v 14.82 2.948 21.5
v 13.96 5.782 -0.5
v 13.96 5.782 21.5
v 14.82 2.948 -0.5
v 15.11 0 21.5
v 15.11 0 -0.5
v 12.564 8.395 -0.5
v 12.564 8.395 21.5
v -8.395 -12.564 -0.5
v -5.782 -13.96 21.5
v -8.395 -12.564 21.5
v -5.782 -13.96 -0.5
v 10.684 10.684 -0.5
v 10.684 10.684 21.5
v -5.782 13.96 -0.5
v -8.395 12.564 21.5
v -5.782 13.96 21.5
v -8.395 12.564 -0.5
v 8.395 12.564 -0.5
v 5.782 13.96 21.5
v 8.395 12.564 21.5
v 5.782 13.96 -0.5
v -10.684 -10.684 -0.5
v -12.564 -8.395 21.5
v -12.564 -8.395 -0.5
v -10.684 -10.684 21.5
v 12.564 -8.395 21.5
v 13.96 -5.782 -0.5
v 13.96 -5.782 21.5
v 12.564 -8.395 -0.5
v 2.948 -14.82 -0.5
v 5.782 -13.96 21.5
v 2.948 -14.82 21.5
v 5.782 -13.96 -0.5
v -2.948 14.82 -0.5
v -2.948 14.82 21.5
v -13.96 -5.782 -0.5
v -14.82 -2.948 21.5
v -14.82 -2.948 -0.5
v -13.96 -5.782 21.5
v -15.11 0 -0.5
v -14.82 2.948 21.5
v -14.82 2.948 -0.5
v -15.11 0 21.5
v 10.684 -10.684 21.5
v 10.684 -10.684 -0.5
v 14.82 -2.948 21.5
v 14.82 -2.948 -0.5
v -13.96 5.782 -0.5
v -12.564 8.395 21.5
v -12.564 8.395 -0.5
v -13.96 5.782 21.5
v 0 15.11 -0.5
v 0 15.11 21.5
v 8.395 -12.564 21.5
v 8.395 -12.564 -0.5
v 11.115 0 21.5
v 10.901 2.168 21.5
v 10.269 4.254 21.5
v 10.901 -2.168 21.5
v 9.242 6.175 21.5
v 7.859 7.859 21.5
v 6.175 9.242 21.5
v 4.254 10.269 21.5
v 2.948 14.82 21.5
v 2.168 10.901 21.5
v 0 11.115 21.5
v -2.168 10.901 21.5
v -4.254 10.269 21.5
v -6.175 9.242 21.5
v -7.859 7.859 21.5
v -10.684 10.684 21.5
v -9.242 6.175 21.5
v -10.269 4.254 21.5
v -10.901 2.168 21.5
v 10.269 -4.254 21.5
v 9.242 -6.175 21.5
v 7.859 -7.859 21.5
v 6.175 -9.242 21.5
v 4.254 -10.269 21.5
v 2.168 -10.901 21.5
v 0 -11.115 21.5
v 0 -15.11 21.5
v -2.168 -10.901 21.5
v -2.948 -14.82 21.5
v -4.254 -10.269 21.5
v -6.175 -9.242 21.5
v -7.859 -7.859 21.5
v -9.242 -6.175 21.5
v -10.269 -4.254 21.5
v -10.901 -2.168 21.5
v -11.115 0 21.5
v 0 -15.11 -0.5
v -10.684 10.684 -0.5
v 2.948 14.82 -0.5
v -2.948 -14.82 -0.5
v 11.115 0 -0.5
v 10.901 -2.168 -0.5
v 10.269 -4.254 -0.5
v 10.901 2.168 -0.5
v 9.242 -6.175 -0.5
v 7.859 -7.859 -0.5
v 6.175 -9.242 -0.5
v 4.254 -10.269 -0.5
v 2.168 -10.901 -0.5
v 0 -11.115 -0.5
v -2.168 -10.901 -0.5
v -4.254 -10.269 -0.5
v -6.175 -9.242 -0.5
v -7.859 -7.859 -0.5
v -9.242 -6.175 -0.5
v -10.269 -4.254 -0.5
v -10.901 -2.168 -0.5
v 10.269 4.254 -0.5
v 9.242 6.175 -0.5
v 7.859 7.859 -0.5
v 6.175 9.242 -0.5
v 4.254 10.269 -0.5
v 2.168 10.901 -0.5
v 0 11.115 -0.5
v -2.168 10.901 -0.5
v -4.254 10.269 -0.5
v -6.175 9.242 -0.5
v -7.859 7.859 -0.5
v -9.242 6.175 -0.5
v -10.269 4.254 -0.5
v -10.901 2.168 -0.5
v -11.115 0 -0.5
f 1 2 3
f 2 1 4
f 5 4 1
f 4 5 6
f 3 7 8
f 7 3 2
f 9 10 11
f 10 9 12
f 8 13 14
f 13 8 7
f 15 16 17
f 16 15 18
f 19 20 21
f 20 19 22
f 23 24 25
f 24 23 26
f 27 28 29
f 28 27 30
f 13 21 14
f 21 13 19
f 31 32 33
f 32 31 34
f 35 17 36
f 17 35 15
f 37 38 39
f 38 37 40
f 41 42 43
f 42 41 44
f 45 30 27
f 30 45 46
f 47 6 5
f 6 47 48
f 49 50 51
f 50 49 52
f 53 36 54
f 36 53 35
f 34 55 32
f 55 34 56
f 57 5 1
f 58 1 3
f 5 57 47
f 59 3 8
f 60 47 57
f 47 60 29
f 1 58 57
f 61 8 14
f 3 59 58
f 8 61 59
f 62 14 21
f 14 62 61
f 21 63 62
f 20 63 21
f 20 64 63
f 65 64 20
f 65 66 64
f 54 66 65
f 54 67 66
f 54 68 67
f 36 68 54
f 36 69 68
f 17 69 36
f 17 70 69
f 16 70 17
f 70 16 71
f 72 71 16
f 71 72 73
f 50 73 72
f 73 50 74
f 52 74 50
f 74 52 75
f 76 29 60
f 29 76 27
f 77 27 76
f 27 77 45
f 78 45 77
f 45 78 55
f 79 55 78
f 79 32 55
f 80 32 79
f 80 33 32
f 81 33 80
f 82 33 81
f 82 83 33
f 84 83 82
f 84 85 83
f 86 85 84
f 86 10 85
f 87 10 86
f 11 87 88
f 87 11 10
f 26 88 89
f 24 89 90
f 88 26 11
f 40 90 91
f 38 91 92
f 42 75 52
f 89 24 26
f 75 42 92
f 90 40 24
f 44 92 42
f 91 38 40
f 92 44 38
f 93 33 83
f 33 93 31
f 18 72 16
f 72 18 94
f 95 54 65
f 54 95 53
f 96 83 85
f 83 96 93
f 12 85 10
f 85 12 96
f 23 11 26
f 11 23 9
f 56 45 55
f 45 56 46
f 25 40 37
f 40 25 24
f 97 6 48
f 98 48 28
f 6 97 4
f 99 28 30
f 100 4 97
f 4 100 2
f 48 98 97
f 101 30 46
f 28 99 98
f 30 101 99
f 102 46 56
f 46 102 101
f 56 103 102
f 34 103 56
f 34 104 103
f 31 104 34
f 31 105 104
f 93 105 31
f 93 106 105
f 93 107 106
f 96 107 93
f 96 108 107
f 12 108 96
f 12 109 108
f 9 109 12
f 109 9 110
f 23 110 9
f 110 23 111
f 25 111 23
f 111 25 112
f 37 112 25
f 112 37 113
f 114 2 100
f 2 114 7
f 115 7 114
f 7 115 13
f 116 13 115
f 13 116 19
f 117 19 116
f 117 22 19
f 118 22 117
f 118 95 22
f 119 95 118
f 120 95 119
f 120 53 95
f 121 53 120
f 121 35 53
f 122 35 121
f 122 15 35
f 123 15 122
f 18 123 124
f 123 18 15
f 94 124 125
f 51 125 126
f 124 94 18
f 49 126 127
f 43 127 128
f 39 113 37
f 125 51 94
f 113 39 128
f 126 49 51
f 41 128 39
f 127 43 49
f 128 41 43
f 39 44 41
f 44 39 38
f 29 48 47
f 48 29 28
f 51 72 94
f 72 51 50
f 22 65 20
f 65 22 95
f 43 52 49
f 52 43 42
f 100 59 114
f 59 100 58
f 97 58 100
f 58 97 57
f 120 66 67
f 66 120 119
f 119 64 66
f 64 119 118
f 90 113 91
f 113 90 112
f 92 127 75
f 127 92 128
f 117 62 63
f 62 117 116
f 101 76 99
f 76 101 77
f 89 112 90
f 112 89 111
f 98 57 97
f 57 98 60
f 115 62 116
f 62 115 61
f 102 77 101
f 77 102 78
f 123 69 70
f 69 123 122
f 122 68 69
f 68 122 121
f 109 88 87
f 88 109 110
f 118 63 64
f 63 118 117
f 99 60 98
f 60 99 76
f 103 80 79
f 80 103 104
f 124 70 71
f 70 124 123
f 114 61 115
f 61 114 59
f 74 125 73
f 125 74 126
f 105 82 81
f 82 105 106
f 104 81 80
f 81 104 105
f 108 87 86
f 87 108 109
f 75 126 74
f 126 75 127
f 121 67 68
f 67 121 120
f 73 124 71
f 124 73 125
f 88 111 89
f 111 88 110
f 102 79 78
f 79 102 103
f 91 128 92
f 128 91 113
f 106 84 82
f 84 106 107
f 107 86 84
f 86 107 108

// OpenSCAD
$fn = 32;

// ----------------------------------------------------------------------
// Two-module gear rim: z12 m2 and z12 m2, 21 mm wide
// ----------------------------------------------------------------------

// --- parameters (mm) ---
module_a = 2;             // first tooth module
teeth_a = 12;             // first band tooth count
module_b = 2;             // second tooth module
teeth_b = 12;             // second band tooth count
band_h = 8;               // height of one tooth band
web_t = 5;                // web thickness between the bands
total = 21;               // overall width over both bands
root_r = 9.5;             // root radius of the coarse band
hub_r = 15.11;            // hub radius
bore_d = 22.23;           // hub bore
hole_count = 4;           // lightening holes
hole_r = 7.75;            // lightening hole circle radius
hole_d = 4;               // lightening hole diameter

band_a = [[9.4, -1.378], [12.124, -1.51], [13.058, -1.154], [13.986, -0.621], [13.986, 0.621], [13.058, 1.154], [12.124, 1.51], [9.4, 1.378], [8.829, 3.507], [11.254, 4.755], [11.885, 5.53], [12.423, 6.456], [11.802, 7.531], [10.732, 7.528], [9.745, 7.369], [7.451, 5.893], [5.893, 7.451], [7.369, 9.745], [7.528, 10.732], [7.531, 11.802], [6.456, 12.423], [5.53, 11.885], [4.755, 11.254], [3.507, 8.829], [1.378, 9.4], [1.51, 12.124], [1.154, 13.058], [0.621, 13.986], [-0.621, 13.986], [-1.154, 13.058], [-1.51, 12.124], [-1.378, 9.4], [-3.507, 8.829], [-4.755, 11.254], [-5.53, 11.885], [-6.456, 12.423], [-7.531, 11.802], [-7.528, 10.732], [-7.369, 9.745], [-5.893, 7.451], [-7.451, 5.893], [-9.745, 7.369], [-10.732, 7.528], [-11.802, 7.531], [-12.423, 6.456], [-11.885, 5.53], [-11.254, 4.755], [-8.829, 3.507], [-9.4, 1.378], [-12.124, 1.51], [-13.058, 1.154], [-13.986, 0.621], [-13.986, -0.621], [-13.058, -1.154], [-12.124, -1.51], [-9.4, -1.378], [-8.829, -3.507], [-11.254, -4.755], [-11.885, -5.53], [-12.423, -6.456], [-11.802, -7.531], [-10.732, -7.528], [-9.745, -7.369], [-7.451, -5.893], [-5.893, -7.451], [-7.369, -9.745], [-7.528, -10.732], [-7.531, -11.802], [-6.456, -12.423], [-5.53, -11.885], [-4.755, -11.254], [-3.507, -8.829], [-1.378, -9.4], [-1.51, -12.124], [-1.154, -13.058], [-0.621, -13.986], [0.621, -13.986], [1.154, -13.058], [1.51, -12.124], [1.378, -9.4], [3.507, -8.829], [4.755, -11.254], [5.53, -11.885], [6.456, -12.423], [7.531, -11.802], [7.528, -10.732], [7.369, -9.745], [5.893, -7.451], [7.451, -5.893], [9.745, -7.369], [10.732, -7.528], [11.802, -7.531], [12.423, -6.456], [11.885, -5.53], [11.254, -4.755], [8.829, -3.507]];
band_b = [[9.4, -1.378], [12.124, -1.51], [13.058, -1.154], [13.986, -0.621], [13.986, 0.621], [13.058, 1.154], [12.124, 1.51], [9.4, 1.378], [8.829, 3.507], [11.254, 4.755], [11.885, 5.53], [12.423, 6.456], [11.802, 7.531], [10.732, 7.528], [9.745, 7.369], [7.451, 5.893], [5.893, 7.451], [7.369, 9.745], [7.528, 10.732], [7.531, 11.802], [6.456, 12.423], [5.53, 11.885], [4.755, 11.254], [3.507, 8.829], [1.378, 9.4], [1.51, 12.124], [1.154, 13.058], [0.621, 13.986], [-0.621, 13.986], [-1.154, 13.058], [-1.51, 12.124], [-1.378, 9.4], [-3.507, 8.829], [-4.755, 11.254], [-5.53, 11.885], [-6.456, 12.423], [-7.531, 11.802], [-7.528, 10.732], [-7.369, 9.745], [-5.893, 7.451], [-7.451, 5.893], [-9.745, 7.369], [-10.732, 7.528], [-11.802, 7.531], [-12.423, 6.456], [-11.885, 5.53], [-11.254, 4.755], [-8.829, 3.507], [-9.4, 1.378], [-12.124, 1.51], [-13.058, 1.154], [-13.986, 0.621], [-13.986, -0.621], [-13.058, -1.154], [-12.124, -1.51], [-9.4, -1.378], [-8.829, -3.507], [-11.254, -4.755], [-11.885, -5.53], [-12.423, -6.456], [-11.802, -7.531], [-10.732, -7.528], [-9.745, -7.369], [-7.451, -5.893], [-5.893, -7.451], [-7.369, -9.745], [-7.528, -10.732], [-7.531, -11.802], [-6.456, -12.423], [-5.53, -11.885], [-4.755, -11.254], [-3.507, -8.829], [-1.378, -9.4], [-1.51, -12.124], [-1.154, -13.058], [-0.621, -13.986], [0.621, -13.986], [1.154, -13.058], [1.51, -12.124], [1.378, -9.4], [3.507, -8.829], [4.755, -11.254], [5.53, -11.885], [6.456, -12.423], [7.531, -11.802], [7.528, -10.732], [7.369, -9.745], [5.893, -7.451], [7.451, -5.893], [9.745, -7.369], [10.732, -7.528], [11.802, -7.531], [12.423, -6.456], [11.885, -5.53], [11.254, -4.755], [8.829, -3.507]];

difference() {
  union() {
    /* tooth band A, overlapping the web by 0.4 mm */
    linear_extrude(height = band_h + 0.4) polygon(band_a);
    /* web */
    translate([0, 0, band_h - 0.4]) cylinder(h = web_t + 0.8, d = 2 * root_r);
    /* tooth band B */
    translate([0, 0, band_h + web_t]) linear_extrude(height = band_h + 0.4) polygon(band_b);
    /* hub */
    translate([0, 0, -0.5]) cylinder(h = total + 1.0, d = 2 * hub_r);
  }
  /* bore */
  translate([0, 0, -2.5]) cylinder(h = total + 5, d = bore_d);
  /* lightening holes through the web */
  for (i = [0 : hole_count - 1]) {
    a = i * 360 / hole_count;
    translate([hole_r * cos(a), hole_r * sin(a), -2.5]) cylinder(h = total + 5, d = hole_d);
  }
}
